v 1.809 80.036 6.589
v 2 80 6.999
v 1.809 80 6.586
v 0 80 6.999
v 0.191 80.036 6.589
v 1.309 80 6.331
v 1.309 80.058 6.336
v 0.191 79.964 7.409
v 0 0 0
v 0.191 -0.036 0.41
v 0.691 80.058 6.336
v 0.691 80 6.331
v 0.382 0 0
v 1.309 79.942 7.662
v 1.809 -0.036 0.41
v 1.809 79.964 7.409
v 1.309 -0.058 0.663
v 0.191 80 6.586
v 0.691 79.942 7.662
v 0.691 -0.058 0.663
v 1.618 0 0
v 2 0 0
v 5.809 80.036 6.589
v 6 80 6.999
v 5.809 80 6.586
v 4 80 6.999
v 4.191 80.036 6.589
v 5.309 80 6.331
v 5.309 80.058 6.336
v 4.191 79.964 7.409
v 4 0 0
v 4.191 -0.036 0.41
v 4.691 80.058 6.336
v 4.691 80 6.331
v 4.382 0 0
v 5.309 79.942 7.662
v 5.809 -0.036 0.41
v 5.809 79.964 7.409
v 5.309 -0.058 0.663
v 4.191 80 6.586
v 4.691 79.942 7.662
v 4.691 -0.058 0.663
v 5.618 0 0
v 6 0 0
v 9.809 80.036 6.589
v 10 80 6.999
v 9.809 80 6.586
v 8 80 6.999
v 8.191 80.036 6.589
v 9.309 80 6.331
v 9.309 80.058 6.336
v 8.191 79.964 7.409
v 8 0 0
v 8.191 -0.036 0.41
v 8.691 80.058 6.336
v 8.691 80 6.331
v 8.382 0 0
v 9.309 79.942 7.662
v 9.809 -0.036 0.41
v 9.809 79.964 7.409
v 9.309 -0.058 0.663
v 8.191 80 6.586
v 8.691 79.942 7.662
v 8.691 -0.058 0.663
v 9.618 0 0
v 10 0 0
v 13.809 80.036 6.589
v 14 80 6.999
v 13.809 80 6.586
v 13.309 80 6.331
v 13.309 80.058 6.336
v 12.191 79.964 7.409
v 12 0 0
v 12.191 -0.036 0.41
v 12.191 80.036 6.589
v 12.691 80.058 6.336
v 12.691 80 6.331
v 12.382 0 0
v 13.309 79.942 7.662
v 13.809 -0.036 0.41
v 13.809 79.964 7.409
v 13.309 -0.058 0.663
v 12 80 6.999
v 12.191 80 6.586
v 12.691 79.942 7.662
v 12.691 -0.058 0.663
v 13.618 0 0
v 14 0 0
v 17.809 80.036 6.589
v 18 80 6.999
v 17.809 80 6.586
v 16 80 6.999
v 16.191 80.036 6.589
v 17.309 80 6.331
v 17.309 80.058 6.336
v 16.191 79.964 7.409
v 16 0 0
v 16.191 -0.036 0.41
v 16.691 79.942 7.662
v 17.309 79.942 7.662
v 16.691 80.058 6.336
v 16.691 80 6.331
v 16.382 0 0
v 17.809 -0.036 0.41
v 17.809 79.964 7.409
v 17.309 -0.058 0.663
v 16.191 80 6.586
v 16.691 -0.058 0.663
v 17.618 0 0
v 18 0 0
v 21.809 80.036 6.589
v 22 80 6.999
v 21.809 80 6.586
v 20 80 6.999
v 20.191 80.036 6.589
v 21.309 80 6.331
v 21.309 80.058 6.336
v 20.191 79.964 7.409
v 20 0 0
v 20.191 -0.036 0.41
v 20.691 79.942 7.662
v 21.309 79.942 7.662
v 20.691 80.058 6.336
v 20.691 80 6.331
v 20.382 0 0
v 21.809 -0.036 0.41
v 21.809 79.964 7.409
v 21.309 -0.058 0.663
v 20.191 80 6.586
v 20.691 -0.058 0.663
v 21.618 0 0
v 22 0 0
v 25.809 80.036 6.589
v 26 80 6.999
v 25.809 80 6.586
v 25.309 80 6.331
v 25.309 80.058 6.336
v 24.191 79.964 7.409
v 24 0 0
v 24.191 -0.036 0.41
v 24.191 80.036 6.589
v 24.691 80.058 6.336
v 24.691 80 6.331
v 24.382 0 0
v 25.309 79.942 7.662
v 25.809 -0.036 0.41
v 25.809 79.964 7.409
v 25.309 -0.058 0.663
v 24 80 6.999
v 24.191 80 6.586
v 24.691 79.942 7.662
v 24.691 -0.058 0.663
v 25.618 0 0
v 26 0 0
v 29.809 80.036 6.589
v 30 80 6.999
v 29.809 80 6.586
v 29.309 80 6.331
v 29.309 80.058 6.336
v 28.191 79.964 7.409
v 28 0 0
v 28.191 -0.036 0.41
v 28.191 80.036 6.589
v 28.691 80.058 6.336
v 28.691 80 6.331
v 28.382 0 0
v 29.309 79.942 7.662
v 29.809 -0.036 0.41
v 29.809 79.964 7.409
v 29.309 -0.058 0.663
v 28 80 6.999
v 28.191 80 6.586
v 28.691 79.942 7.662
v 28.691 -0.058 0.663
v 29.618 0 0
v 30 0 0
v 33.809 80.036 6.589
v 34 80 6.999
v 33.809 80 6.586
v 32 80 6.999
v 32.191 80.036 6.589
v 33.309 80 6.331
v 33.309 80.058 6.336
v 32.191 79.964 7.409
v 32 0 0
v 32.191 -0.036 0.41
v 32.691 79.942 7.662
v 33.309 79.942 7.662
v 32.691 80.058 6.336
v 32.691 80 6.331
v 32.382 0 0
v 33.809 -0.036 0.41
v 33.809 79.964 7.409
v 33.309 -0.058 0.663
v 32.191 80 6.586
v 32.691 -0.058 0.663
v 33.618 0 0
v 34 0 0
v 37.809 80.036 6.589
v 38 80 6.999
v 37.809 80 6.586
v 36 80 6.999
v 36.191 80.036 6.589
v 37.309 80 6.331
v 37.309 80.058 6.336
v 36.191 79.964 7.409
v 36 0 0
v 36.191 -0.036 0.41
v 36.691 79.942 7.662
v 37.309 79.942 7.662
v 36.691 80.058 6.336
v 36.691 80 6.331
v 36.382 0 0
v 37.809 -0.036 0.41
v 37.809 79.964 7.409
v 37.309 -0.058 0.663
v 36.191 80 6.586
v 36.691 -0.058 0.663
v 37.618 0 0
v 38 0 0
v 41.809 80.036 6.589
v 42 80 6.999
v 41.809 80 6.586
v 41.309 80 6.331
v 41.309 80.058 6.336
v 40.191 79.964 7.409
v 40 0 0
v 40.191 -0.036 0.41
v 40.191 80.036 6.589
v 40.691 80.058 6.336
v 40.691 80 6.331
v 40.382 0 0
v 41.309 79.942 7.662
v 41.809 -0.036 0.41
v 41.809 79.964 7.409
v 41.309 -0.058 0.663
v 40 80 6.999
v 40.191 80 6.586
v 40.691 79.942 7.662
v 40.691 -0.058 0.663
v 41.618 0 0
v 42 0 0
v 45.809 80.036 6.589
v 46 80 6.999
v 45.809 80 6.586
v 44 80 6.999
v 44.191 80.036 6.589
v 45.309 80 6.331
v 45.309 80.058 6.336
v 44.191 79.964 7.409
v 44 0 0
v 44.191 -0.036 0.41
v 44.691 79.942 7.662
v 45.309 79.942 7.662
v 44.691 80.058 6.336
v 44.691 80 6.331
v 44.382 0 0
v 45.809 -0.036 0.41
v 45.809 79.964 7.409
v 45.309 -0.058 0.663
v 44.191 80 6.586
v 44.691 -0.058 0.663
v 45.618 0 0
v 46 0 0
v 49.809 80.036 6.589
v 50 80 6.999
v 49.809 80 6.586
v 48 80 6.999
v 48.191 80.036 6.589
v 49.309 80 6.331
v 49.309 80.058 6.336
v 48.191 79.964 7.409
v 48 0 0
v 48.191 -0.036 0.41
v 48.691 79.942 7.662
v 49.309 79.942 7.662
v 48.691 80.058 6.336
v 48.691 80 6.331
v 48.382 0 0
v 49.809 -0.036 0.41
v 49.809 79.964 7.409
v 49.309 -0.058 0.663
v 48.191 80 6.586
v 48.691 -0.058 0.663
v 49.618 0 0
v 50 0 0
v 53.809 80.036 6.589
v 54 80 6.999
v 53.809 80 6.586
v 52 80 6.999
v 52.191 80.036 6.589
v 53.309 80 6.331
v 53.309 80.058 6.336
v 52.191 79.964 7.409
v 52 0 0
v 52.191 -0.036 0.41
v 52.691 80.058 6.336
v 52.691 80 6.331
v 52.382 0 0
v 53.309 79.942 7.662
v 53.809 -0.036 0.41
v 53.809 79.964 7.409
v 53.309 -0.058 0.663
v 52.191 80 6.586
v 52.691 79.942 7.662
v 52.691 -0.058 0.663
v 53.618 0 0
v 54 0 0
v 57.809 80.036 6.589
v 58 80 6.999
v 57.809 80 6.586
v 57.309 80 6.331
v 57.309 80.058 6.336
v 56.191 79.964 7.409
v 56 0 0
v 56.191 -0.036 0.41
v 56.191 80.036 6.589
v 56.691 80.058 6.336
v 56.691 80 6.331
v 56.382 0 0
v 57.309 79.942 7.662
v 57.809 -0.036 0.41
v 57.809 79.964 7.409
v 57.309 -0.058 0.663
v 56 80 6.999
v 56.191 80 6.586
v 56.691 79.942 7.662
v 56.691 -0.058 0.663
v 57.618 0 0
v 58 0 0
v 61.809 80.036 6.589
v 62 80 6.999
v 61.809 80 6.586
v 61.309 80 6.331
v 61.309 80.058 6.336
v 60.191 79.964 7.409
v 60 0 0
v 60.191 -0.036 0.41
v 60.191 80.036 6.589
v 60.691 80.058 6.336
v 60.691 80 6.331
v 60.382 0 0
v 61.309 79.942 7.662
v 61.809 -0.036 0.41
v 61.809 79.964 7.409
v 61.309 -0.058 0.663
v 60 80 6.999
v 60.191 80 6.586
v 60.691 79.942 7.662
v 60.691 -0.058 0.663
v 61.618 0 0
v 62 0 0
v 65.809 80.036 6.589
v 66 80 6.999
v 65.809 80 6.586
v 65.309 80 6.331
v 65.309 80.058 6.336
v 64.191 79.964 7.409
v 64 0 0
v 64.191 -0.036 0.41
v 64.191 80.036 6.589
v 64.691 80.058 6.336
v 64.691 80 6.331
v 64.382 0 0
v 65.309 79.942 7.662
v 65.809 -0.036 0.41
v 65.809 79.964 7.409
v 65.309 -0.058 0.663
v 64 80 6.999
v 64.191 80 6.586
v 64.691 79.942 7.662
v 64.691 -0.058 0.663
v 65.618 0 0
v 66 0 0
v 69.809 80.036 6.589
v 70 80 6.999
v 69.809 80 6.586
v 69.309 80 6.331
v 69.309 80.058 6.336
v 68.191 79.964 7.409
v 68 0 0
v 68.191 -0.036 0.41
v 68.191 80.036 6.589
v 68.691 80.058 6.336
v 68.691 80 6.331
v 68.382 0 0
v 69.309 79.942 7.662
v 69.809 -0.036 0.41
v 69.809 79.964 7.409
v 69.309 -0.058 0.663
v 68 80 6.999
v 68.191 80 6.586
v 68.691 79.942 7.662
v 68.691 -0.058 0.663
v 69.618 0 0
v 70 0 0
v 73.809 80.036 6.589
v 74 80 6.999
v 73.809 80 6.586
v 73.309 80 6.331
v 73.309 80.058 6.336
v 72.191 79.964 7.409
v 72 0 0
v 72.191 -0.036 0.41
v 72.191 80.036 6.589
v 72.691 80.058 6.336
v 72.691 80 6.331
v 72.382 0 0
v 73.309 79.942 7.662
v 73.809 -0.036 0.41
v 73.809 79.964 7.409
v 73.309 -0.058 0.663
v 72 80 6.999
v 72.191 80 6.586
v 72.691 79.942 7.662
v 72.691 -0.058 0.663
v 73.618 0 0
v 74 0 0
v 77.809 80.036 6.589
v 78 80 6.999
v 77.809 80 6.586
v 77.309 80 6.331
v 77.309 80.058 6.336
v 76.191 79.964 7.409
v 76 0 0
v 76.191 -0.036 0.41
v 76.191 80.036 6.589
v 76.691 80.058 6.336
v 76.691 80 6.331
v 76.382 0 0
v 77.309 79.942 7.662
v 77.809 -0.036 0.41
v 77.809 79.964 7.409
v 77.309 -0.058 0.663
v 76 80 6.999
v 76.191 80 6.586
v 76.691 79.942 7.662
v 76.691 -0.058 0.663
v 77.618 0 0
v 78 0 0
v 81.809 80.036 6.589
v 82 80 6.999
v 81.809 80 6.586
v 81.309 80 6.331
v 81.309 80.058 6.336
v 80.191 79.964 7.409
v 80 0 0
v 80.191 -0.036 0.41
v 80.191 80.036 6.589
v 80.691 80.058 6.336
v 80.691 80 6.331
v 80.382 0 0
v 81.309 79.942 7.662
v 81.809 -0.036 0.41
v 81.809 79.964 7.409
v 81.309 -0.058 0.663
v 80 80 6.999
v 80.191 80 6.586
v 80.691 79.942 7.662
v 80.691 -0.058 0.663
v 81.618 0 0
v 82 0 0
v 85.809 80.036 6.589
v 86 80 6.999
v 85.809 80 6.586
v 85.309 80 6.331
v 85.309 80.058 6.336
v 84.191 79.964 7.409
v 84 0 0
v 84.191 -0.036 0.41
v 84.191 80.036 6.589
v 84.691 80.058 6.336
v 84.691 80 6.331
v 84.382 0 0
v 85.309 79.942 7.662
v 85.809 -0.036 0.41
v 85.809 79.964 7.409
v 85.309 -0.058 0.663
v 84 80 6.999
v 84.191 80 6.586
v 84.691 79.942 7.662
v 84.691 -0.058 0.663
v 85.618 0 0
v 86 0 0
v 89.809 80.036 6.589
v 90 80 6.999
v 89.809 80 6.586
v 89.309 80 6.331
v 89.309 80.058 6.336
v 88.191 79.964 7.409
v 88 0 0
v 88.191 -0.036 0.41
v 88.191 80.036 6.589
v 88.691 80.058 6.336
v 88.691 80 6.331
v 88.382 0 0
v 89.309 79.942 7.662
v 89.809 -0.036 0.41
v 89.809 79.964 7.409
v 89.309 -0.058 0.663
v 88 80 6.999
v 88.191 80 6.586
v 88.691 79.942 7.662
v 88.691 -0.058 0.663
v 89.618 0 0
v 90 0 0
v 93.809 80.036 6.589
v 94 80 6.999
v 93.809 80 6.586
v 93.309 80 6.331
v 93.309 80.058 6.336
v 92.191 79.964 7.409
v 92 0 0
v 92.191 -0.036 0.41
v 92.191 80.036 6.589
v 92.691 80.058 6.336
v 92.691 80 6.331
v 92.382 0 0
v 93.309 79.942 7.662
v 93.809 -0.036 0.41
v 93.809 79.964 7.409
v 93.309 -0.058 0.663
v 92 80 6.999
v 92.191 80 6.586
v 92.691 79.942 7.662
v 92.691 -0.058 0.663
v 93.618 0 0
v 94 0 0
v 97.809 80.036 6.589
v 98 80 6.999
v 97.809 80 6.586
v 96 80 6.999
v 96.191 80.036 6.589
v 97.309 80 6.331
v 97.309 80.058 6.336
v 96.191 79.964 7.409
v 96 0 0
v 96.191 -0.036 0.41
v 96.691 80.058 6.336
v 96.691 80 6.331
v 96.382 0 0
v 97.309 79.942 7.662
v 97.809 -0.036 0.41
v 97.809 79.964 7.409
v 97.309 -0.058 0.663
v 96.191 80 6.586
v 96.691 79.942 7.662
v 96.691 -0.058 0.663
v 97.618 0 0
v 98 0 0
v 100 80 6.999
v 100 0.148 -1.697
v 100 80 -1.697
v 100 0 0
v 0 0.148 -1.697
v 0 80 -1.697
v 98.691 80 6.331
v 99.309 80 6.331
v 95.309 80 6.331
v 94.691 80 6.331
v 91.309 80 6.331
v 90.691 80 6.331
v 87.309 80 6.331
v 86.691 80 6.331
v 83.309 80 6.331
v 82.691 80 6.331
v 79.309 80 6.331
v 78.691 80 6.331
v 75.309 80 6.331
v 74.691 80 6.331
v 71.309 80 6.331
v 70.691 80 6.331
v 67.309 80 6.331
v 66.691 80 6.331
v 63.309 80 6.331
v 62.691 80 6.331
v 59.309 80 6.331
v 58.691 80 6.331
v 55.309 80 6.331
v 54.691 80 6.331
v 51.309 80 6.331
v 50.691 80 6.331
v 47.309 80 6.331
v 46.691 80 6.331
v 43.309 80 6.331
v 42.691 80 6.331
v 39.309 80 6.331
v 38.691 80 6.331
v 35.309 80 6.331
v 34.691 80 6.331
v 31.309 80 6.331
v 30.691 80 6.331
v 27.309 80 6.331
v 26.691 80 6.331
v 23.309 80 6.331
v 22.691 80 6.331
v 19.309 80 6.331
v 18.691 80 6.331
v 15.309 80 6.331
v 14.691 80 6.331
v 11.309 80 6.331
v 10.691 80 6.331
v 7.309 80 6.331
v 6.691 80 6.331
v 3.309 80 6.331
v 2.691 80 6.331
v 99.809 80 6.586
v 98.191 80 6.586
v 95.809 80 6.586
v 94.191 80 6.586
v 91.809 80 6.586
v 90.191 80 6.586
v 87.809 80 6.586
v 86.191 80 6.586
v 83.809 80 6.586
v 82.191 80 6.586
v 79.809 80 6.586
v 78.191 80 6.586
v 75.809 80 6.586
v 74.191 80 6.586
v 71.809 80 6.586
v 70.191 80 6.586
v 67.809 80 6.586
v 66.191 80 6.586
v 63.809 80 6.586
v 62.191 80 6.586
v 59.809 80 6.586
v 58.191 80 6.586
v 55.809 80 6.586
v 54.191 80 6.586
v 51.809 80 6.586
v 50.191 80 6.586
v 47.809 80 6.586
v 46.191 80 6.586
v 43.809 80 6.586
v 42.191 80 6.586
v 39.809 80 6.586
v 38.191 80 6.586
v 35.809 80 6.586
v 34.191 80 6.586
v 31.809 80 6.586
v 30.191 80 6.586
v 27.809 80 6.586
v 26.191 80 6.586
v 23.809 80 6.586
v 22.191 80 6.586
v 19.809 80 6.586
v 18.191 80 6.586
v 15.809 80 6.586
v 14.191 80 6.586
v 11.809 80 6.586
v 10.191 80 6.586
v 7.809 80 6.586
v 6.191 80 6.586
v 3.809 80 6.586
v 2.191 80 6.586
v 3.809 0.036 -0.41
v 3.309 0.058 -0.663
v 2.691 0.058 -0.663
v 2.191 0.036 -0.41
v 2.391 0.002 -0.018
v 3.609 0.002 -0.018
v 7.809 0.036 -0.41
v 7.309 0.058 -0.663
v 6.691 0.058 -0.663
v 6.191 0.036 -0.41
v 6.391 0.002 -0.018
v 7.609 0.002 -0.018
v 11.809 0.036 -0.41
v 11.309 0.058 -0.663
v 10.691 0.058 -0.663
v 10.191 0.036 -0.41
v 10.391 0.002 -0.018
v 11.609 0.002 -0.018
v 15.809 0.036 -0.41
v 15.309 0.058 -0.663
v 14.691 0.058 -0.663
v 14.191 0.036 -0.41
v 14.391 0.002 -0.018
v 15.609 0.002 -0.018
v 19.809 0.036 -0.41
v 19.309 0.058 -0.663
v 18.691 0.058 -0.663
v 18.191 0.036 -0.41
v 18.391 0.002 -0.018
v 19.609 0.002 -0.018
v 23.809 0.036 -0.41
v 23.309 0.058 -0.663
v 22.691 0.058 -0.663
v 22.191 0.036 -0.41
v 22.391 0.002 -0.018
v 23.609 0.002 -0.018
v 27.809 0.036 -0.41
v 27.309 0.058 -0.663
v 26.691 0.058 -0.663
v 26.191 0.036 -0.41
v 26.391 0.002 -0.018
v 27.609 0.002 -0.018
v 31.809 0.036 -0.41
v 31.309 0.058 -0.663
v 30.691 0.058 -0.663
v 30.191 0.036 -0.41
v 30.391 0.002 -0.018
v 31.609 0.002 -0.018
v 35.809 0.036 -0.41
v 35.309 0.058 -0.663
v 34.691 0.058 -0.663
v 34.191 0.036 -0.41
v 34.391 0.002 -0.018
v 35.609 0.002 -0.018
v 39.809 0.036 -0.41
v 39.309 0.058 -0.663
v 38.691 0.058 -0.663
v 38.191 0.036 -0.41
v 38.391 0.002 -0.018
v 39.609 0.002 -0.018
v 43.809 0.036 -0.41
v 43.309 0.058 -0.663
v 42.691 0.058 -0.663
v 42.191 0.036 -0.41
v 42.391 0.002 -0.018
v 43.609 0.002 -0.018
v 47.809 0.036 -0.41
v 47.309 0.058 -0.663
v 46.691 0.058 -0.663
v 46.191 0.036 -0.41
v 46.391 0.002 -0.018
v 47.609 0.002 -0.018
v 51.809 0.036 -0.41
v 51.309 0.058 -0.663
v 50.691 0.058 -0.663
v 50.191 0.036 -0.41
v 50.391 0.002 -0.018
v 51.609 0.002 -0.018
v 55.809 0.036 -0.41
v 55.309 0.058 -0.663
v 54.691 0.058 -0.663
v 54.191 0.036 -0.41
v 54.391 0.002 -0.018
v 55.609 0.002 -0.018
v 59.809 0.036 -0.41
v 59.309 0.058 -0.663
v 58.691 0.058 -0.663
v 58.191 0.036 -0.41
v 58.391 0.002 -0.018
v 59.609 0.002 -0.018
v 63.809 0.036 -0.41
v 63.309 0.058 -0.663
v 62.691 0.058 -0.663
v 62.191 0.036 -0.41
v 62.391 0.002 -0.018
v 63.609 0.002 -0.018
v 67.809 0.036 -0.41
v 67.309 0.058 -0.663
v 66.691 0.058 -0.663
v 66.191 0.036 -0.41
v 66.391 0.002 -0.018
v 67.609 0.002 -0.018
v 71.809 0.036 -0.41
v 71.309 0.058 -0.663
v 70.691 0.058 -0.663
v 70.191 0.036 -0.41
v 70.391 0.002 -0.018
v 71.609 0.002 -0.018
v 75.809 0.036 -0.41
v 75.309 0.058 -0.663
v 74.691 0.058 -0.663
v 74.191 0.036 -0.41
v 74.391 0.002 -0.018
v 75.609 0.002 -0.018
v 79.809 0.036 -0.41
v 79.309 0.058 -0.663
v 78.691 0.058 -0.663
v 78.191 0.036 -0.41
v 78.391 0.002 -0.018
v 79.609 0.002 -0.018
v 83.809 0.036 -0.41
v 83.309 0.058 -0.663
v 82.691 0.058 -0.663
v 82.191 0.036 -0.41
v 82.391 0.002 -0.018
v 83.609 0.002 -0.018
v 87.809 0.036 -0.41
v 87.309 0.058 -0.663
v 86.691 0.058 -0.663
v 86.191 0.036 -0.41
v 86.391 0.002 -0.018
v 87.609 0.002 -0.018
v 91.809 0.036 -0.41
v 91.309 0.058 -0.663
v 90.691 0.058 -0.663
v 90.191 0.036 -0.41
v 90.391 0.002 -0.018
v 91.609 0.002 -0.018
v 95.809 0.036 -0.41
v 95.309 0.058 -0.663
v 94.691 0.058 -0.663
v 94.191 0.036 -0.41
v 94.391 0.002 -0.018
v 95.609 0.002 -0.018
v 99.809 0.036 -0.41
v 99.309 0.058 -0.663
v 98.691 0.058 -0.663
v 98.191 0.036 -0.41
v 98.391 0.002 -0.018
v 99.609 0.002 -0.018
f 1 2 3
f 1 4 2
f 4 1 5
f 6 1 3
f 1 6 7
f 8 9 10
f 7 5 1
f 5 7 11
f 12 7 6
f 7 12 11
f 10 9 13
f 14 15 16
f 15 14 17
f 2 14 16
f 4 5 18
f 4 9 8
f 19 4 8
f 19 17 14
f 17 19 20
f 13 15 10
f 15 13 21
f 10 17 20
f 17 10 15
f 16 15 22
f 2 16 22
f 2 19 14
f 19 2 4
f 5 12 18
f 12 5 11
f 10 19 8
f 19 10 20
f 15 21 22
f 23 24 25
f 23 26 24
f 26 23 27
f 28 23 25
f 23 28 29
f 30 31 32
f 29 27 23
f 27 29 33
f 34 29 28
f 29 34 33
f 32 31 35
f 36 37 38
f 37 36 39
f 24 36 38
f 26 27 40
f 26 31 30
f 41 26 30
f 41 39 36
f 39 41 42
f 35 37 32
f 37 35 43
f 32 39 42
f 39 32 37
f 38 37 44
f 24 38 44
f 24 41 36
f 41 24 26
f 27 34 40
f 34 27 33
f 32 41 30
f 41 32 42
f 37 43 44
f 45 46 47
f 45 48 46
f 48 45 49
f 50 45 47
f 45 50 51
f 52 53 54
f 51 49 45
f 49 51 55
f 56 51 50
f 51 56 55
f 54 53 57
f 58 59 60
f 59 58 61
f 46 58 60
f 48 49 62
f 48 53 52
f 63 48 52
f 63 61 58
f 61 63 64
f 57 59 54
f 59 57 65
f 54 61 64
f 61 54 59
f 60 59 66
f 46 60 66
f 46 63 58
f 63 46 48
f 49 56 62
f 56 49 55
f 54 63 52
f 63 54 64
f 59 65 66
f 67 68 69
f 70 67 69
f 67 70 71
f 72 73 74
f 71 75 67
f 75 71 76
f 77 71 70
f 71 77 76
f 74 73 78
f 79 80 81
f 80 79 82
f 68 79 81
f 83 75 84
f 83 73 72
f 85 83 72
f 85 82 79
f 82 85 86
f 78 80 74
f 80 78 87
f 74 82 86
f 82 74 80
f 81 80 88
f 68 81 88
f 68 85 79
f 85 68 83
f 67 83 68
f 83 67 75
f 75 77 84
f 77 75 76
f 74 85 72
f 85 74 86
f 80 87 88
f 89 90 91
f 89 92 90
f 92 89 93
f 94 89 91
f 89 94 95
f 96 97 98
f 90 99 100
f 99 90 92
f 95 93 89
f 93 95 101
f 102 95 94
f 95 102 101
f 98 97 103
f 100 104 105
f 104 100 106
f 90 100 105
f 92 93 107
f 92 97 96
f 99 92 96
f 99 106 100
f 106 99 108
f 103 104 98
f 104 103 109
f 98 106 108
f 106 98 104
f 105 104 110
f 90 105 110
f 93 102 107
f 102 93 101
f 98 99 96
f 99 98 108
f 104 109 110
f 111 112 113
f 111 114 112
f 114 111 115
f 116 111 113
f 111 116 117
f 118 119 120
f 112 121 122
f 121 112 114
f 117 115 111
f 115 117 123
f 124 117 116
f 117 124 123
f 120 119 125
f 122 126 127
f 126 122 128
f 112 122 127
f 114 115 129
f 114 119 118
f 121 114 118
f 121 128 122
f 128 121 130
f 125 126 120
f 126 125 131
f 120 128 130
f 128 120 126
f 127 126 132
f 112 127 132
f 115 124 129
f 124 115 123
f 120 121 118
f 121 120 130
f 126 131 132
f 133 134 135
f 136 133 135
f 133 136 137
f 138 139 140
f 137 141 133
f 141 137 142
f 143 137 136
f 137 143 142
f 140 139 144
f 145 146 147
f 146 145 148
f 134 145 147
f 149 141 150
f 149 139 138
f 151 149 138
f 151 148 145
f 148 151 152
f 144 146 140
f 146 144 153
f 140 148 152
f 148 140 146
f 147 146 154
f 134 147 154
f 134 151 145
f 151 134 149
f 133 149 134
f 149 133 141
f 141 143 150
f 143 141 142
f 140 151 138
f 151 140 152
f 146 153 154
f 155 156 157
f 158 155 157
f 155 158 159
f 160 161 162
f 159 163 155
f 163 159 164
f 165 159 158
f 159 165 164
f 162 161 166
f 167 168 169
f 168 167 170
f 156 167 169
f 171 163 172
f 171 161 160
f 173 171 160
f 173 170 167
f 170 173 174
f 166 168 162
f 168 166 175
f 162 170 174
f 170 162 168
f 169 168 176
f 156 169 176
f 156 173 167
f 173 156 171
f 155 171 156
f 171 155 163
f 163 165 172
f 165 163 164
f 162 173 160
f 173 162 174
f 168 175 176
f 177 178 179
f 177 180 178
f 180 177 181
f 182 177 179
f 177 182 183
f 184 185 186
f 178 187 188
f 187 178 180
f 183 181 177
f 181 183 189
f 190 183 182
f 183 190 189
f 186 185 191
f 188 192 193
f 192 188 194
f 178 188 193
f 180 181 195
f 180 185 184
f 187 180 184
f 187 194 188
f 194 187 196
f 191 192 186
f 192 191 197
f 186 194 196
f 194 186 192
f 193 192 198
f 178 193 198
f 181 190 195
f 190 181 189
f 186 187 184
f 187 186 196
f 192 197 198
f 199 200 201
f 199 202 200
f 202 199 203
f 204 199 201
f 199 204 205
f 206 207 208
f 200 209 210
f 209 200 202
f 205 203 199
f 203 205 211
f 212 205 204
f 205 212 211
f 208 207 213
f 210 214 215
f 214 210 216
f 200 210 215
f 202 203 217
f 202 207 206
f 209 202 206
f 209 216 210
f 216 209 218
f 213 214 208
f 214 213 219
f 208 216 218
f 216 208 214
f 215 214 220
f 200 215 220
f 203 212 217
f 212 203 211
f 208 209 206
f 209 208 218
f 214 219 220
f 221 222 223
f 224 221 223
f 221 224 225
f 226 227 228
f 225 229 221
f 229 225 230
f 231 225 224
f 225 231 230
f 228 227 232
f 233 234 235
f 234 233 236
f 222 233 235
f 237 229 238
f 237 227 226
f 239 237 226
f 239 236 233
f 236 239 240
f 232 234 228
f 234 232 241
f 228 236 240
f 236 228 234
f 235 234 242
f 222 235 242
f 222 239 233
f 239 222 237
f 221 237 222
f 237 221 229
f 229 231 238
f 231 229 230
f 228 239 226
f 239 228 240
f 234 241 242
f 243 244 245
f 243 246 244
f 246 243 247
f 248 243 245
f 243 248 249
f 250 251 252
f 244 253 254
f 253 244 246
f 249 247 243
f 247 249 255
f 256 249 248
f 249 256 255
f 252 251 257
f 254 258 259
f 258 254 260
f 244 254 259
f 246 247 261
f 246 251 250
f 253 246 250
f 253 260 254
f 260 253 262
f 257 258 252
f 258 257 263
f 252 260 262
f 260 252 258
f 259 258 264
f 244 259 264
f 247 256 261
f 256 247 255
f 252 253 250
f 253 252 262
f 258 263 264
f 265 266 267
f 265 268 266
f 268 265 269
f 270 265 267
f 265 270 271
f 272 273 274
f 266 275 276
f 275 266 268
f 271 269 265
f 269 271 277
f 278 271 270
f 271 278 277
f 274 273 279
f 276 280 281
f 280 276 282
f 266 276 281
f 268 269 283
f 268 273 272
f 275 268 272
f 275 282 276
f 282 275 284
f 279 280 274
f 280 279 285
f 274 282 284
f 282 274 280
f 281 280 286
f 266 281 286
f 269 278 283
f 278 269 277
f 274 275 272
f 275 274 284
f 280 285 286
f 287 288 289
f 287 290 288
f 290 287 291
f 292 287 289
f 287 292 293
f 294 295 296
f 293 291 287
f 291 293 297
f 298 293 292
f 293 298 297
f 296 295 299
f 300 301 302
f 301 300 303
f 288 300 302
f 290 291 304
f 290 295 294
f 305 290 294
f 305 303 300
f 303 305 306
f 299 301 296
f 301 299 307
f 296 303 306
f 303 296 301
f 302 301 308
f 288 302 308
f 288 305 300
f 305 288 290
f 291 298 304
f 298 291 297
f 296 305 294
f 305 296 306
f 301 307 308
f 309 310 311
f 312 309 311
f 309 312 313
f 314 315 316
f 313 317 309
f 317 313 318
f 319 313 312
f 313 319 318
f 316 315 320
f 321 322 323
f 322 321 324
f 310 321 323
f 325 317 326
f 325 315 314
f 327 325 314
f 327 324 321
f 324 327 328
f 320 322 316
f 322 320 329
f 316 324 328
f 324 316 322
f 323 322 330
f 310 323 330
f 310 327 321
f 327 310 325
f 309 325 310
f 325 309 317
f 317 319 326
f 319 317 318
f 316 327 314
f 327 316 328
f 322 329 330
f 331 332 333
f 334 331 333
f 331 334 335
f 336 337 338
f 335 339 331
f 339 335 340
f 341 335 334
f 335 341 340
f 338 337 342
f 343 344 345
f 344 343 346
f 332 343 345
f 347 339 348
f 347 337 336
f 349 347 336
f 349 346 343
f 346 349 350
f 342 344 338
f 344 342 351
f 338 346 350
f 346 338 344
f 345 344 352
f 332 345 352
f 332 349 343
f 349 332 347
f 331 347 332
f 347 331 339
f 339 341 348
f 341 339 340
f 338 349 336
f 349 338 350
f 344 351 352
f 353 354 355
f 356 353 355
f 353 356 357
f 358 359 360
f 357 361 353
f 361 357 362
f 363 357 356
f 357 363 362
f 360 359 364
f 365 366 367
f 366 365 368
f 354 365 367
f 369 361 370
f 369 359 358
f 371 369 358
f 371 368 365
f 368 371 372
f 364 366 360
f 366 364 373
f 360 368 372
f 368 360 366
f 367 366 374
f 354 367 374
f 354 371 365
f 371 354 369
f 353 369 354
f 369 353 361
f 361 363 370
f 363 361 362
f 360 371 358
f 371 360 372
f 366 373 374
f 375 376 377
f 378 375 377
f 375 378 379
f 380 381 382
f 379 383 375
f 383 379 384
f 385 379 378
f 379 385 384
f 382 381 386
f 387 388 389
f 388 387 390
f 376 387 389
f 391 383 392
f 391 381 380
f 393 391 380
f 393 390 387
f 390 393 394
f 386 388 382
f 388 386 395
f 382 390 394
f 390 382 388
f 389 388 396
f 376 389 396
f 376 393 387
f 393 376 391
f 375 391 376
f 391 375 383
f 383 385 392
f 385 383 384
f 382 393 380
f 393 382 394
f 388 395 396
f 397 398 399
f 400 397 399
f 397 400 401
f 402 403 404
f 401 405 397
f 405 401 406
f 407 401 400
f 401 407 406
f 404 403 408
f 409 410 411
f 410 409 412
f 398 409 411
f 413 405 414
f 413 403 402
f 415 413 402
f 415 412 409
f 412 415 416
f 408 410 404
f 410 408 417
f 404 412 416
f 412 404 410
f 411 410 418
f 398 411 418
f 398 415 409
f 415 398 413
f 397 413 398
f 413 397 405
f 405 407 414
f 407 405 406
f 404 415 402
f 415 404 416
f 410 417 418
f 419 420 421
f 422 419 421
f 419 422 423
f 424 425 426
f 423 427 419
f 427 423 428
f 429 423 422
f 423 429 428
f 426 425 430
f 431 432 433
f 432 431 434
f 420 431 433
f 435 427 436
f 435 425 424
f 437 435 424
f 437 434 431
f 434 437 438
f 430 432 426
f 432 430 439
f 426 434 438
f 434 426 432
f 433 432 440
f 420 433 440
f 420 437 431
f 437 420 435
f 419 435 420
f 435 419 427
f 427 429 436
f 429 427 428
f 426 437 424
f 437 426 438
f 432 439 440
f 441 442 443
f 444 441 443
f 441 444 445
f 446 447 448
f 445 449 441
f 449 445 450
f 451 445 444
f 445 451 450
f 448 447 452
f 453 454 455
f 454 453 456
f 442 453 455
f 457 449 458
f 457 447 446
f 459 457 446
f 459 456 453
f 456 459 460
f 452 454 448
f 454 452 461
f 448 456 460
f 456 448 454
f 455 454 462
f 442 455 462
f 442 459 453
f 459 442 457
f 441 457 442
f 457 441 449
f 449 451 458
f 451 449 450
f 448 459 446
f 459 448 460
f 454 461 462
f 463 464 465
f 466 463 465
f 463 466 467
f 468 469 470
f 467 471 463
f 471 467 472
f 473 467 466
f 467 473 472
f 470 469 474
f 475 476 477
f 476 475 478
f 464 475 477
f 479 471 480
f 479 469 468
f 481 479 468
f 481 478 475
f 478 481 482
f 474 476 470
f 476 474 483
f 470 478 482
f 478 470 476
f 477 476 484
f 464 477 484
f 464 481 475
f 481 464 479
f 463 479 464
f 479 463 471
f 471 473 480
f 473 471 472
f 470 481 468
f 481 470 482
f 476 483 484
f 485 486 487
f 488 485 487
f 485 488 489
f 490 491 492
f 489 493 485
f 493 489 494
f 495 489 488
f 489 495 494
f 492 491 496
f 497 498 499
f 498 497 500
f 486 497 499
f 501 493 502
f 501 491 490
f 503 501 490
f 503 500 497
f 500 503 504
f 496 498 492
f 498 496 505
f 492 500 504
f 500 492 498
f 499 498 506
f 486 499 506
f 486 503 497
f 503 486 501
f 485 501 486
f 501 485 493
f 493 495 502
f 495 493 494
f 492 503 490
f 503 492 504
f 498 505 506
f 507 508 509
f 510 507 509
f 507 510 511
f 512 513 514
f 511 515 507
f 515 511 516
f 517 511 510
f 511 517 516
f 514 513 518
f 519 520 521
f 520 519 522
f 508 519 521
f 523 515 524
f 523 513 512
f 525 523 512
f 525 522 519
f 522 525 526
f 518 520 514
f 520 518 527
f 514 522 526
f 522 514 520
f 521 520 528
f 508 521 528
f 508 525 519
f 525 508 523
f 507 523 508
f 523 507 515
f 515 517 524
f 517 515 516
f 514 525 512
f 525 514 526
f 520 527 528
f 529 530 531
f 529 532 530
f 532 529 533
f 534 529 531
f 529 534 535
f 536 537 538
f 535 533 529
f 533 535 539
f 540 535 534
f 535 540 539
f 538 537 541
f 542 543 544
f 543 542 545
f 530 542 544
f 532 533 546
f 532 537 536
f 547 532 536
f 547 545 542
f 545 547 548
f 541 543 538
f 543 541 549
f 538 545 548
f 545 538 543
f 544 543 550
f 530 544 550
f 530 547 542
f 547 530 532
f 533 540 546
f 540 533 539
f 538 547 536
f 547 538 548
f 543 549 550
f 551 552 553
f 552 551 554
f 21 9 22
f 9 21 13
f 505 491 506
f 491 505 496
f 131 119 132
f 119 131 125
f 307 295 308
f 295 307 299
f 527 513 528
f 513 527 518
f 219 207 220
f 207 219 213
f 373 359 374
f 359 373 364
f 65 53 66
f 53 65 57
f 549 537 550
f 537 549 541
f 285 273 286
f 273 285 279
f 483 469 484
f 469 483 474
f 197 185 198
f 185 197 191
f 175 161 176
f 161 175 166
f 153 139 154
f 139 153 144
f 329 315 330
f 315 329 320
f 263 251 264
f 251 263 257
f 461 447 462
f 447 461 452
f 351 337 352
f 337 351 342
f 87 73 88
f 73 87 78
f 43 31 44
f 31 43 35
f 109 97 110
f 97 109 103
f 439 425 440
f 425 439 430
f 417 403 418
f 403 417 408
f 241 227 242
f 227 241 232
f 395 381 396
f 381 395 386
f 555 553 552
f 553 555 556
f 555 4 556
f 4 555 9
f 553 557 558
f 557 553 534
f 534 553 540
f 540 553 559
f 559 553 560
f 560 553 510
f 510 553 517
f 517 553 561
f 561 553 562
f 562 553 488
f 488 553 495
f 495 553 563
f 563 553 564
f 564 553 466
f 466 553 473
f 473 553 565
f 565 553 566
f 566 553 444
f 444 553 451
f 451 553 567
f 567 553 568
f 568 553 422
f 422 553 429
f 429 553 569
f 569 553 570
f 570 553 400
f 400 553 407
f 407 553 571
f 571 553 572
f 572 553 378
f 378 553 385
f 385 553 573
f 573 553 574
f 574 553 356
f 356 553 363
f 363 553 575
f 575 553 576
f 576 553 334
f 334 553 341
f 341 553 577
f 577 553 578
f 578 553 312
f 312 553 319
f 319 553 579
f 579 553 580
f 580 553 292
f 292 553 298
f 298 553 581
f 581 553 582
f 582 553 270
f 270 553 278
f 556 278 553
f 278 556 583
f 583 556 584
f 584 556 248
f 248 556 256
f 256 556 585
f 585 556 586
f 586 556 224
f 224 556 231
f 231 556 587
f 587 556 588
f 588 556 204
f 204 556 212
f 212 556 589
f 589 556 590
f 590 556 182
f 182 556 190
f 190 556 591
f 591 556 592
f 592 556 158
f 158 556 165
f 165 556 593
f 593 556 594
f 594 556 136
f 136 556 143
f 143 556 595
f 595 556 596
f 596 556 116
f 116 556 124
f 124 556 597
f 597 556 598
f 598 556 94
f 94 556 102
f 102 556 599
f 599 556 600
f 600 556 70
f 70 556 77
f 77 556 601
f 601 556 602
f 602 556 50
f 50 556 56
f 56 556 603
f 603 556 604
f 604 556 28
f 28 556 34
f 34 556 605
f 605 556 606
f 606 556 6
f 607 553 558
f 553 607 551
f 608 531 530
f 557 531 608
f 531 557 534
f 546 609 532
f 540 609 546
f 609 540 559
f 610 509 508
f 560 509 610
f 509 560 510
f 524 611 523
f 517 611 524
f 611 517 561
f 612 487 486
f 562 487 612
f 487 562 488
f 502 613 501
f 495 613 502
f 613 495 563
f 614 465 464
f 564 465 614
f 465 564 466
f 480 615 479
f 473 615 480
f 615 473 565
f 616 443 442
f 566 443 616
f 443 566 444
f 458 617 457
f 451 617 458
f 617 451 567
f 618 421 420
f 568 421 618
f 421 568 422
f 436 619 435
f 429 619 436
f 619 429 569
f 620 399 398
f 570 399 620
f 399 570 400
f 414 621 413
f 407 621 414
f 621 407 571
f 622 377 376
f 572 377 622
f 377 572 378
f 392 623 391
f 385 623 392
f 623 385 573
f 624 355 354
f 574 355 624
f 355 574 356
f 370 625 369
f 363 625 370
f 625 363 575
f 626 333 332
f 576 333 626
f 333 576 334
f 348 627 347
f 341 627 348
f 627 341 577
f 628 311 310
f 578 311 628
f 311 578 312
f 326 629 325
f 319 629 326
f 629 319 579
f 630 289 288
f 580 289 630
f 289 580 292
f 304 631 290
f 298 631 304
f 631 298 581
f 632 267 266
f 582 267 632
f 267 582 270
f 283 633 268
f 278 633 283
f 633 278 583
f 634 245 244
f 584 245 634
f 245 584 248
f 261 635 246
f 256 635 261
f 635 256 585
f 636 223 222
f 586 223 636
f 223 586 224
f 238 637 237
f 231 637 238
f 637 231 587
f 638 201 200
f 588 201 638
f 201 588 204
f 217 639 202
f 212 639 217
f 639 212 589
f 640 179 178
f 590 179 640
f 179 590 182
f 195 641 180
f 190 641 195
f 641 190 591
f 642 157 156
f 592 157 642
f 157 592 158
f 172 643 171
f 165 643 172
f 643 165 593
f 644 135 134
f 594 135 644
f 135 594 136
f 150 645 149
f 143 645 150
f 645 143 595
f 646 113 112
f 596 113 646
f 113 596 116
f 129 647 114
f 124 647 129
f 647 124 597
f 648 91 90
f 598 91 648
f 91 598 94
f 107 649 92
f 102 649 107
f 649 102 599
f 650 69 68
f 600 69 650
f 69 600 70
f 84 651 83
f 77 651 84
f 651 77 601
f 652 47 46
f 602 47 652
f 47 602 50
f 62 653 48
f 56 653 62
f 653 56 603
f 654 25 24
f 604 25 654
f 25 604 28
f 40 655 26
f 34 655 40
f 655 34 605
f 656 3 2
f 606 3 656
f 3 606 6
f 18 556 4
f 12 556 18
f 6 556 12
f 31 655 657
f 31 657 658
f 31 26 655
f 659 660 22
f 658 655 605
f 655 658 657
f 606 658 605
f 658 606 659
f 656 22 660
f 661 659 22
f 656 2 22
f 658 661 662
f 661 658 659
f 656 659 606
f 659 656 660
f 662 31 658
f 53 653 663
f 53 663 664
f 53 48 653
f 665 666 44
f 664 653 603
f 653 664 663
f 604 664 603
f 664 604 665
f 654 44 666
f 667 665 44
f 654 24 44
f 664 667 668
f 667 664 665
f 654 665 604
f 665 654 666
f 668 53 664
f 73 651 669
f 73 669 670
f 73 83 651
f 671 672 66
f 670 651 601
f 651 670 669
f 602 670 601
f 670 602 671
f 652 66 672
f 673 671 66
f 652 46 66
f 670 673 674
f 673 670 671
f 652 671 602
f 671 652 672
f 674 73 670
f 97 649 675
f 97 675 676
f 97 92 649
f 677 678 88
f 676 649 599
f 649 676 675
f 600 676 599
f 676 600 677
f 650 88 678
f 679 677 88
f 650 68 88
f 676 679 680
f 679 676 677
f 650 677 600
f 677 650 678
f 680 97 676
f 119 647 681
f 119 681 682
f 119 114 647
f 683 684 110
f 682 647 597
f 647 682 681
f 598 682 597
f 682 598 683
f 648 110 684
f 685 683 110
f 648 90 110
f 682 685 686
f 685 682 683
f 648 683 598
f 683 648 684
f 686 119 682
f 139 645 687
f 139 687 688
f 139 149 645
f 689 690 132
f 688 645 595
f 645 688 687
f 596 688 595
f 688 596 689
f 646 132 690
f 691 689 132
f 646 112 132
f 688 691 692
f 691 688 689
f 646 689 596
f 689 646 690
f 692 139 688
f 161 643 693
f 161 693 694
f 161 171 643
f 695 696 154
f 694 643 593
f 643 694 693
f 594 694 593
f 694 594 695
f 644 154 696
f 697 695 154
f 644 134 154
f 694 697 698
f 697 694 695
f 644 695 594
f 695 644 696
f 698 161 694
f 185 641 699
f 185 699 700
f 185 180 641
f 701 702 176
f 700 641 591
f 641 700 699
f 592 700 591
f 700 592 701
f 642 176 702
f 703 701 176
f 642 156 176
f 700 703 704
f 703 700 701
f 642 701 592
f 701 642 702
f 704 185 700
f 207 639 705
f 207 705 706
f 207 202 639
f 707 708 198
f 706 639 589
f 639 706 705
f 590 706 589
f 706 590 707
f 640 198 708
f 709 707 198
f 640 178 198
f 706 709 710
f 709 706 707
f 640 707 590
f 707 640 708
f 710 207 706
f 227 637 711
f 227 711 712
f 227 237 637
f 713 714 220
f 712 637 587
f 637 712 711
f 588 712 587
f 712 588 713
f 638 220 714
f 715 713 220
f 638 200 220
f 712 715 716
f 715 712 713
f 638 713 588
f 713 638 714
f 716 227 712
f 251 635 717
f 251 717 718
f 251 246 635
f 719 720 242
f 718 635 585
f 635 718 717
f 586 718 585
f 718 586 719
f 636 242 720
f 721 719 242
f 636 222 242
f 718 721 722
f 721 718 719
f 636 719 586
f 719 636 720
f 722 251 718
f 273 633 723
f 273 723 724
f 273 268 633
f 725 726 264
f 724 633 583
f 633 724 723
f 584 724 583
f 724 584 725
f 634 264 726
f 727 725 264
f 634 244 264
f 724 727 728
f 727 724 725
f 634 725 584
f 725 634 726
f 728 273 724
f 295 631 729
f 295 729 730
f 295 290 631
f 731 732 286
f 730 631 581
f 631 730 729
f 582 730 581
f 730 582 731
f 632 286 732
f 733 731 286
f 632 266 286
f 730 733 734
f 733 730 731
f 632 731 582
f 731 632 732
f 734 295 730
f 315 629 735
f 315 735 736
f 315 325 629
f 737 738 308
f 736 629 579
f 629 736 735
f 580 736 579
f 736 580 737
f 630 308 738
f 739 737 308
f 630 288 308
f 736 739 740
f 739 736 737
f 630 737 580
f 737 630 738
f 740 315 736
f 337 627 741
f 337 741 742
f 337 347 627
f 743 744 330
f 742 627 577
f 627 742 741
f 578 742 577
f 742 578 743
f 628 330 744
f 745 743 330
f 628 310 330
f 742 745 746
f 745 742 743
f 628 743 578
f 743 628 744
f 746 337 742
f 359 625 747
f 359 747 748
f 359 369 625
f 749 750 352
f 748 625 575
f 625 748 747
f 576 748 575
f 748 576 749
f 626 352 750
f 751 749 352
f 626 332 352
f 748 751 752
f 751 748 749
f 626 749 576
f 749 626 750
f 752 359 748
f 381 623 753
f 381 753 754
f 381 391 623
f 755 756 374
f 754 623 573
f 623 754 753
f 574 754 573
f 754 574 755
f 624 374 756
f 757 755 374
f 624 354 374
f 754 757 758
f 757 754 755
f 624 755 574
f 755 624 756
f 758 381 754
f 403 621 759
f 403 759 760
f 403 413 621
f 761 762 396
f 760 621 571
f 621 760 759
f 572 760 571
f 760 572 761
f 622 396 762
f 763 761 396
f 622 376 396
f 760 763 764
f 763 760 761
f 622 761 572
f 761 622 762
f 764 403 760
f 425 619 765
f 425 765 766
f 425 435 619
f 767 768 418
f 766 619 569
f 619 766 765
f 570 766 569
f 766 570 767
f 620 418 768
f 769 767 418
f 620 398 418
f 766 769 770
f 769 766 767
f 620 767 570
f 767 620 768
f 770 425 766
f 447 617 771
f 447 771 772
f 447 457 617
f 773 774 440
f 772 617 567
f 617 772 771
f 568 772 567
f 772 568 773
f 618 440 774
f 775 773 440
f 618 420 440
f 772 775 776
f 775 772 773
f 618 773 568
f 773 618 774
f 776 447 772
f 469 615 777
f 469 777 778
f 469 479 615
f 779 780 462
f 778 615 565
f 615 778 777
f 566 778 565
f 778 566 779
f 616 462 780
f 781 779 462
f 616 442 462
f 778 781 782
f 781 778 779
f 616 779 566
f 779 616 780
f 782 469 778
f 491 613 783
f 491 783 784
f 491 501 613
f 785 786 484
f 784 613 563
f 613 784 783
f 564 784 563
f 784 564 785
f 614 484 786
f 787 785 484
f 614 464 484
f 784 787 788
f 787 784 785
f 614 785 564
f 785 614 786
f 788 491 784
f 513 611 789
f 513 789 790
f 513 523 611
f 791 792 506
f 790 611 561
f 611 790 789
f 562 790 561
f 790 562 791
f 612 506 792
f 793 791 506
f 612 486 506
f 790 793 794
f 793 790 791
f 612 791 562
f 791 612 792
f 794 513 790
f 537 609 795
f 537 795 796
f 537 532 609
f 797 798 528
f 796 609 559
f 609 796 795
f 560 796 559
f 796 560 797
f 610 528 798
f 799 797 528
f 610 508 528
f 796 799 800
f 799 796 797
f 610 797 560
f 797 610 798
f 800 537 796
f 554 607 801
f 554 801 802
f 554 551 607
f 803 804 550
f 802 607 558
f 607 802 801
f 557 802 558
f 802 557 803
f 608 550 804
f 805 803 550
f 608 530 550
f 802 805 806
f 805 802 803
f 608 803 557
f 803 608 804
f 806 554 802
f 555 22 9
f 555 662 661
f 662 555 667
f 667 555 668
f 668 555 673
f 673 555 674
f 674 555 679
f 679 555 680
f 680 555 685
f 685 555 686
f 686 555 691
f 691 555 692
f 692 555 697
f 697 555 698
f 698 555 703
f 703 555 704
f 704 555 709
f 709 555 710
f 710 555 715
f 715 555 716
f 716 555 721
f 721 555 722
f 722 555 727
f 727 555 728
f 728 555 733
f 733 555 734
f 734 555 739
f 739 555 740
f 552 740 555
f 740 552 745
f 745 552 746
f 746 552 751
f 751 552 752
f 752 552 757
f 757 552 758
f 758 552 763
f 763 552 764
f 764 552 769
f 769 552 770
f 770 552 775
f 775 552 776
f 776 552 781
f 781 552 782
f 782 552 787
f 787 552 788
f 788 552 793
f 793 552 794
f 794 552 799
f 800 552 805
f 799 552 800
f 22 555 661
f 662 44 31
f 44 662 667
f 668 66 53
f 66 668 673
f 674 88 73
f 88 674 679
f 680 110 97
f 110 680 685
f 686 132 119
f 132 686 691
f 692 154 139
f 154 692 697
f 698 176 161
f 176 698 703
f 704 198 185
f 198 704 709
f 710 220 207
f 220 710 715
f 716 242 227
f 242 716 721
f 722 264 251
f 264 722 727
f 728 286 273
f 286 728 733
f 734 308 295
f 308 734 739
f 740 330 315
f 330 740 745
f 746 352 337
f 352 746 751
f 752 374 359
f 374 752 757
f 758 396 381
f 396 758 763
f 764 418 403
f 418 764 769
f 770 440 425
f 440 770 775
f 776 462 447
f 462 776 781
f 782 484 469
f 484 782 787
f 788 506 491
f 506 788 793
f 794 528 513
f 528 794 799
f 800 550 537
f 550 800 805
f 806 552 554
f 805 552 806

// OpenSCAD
/* storage-tank.scad
 *
 * Copyright (C) Robert B. Ross, 2014
 *
 * This software is released under the Creative Commons
 * Attribution-ShareAlike 4.0 International Public License.
 */

corRoof();

/* corRoof() -- generate an angled corrogated roof
 *
 * Note, angle is in the Y dimension.
 */
module corRoof(xDim = 100, yDim = 80, angle = 5) {
	corRad = 1;
	$fn = 10;
	height = tan(angle) * yDim;
	topLength = yDim / cos(angle);

	/* zOff is an offset such that the cutout cylinders will leave some material
	 * near the x axis. The "+ 1" leaves approximately 1mm of height at x=0.
	 */
	zOff = -1 * (0.7 * corRad * cos(angle)) - 1;

	difference() {
		union() {
			translate([xDim, 0, 0]) rotate([0,-90,0]) linear_extrude(h=xDim)
				polygon(points = [[zOff,0], [zOff,yDim], [height, yDim], [0,0]],
						paths = [[0,1,2,3,0]]);

			for (i = [0 : 2 : xDim / (corRad*2)]) {
				translate([(2*i+1) *corRad, 0, 0]) rotate([-90+angle,0,0])
					scale([1,0.7,1]) cylinder(r=corRad,h = topLength);
			}
		}

		for (i = [1 : 2 : xDim / (corRad*2)]) {
			translate([(2*i+1)*corRad, 0, 0]) rotate([-90+angle,0,0])
				scale([1,0.7,1]) cylinder(r=corRad,h = topLength);
		}

		/* cut angled slice off front end */
		translate([xDim, 0, 0])  rotate([0,-90,0]) linear_extrude(h=xDim) 
			polygon(points = [[0,0], [zOff, 0], [zOff,-1* zOff / tan(90 - angle)]],
				paths = [[0,1,2,0]]);

		/* cut leftover cylinder off right side (math is sloppy here) */
		translate([xDim, -2 * corRad, -0.5 * height]) 
			cube([5*corRad, yDim + 5 * corRad, 2*height], center=false);
	}
}

/*
 * Local variables:
 *  mode: C
 *  c-indent-level: 4
 *  c-basic-offset: 4
 * End:
 *
 * vim: ts=8 sts=4 sw=4 expandtab
 */
